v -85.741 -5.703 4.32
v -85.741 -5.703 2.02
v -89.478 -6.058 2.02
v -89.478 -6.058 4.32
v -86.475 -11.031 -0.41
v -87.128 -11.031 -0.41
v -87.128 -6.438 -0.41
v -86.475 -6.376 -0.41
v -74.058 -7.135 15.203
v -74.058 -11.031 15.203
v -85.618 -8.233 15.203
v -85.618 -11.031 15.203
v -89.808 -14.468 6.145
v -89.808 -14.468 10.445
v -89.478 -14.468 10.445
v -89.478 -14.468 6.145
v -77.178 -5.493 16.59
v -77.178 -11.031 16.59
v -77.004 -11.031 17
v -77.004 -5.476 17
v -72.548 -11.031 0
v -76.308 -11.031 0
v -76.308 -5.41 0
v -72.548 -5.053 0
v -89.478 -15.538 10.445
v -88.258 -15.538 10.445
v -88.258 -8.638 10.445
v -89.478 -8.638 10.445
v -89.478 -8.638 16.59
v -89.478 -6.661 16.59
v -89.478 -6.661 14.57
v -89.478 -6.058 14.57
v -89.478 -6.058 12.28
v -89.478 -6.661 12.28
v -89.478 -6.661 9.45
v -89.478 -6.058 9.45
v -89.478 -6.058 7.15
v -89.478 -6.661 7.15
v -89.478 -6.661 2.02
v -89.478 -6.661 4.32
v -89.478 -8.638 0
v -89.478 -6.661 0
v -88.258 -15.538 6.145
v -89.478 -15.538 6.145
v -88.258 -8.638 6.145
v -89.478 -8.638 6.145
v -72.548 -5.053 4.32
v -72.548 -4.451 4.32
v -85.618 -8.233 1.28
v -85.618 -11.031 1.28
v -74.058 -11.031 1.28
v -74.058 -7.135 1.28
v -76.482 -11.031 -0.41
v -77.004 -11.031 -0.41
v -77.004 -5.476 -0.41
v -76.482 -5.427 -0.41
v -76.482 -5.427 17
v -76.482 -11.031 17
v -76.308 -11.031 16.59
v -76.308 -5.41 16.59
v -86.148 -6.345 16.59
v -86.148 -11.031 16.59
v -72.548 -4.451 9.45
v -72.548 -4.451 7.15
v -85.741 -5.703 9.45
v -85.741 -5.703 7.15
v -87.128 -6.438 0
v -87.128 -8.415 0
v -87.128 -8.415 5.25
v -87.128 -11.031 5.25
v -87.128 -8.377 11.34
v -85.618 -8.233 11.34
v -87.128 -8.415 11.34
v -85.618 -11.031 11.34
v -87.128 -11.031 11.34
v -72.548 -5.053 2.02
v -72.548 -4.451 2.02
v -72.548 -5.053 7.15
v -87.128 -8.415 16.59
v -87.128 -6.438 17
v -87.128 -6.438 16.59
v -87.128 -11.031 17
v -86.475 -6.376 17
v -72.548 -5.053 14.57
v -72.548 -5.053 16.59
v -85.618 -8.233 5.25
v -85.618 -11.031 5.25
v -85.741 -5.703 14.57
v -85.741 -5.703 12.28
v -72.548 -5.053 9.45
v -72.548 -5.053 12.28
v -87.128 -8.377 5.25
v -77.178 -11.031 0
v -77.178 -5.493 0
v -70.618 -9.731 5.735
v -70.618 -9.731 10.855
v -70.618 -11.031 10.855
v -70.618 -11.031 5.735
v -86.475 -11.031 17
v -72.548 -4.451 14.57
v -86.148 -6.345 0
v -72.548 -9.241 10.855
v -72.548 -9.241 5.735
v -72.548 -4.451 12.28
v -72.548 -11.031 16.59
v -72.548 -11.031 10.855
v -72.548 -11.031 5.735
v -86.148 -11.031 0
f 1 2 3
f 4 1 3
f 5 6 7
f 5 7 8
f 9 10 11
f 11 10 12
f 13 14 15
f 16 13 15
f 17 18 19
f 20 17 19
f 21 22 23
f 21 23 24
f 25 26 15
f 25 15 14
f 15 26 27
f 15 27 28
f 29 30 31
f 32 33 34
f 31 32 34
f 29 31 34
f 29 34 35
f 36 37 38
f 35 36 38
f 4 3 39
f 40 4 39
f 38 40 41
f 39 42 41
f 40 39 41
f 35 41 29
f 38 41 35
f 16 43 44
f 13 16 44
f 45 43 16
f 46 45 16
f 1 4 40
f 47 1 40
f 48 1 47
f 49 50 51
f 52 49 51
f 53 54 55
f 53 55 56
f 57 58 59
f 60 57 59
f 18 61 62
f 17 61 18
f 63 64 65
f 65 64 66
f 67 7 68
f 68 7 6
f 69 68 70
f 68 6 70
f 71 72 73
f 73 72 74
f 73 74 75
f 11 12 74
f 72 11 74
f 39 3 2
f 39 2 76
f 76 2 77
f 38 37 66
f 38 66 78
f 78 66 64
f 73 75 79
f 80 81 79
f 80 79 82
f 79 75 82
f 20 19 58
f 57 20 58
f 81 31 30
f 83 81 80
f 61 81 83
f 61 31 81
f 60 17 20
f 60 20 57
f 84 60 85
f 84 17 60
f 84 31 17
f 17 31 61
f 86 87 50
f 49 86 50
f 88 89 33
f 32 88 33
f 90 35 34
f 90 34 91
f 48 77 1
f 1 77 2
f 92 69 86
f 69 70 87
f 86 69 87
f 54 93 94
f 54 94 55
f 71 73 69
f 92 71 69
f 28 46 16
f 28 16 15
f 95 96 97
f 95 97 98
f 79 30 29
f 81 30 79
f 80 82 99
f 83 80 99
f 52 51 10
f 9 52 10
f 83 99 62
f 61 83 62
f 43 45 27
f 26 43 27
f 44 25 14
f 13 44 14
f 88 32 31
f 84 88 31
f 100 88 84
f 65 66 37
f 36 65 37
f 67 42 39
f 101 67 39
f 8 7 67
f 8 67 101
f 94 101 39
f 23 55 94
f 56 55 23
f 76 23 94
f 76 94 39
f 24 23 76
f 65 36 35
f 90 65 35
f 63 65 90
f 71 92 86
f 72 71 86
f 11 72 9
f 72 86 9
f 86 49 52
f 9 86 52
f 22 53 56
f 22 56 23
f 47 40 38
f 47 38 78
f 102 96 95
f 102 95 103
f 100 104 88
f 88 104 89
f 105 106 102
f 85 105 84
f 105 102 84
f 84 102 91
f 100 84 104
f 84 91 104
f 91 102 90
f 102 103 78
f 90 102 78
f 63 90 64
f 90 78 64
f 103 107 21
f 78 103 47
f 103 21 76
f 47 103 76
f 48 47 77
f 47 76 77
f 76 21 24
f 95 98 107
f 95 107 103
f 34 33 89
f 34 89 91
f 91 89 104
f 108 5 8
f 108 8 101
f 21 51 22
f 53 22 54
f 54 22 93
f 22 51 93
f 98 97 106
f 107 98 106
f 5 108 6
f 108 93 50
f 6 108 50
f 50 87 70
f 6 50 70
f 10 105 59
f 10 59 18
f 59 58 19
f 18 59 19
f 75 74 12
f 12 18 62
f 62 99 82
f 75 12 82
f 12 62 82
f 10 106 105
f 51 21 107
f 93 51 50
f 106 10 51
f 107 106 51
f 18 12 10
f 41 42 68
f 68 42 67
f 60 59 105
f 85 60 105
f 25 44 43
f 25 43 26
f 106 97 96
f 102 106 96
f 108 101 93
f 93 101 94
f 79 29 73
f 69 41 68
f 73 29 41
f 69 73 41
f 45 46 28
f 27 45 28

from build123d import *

# Parameters (mm, degrees)
BOSS_EXTRUDE1_DEPTH              = 16.59
BOSS_EXTRUDE2_DEPTH              = 6
SKETCH4_W                        = 17.571797515
SKETCH4_H                        = 4.04
SKETCH4_H_2                      = 2.83
CUT_EXTRUDE1_DEPTH               = 0.6
CUT_EXTRUDE2_DEPTH               = 1
SKETCH8_W                        = 5.12
SKETCH8_H                        = 1.79
BOSS_EXTRUDE3_DEPTH              = 1.93
CUT_EXTRUDE4_REACH               = 92.856
CUT_EXTRUDE5_REACH               = 95.246
CUT_EXTRUDE5_OFFSET_FROM_SURFACE = 1.93
SKETCH11_W                       = 4.3
SKETCH11_H                       = 6.9
BOSS_EXTRUDE4_DEPTH              = 1.22
BOSS_EXTRUDE5_DEPTH              = 4.3


with BuildPart() as part:
    # Sketch1 → Boss-Extrude1 (new body)
    with BuildSketch(Plane.XY):
        Polygon((-87.128079616, -11.030638703), (-72.548079616, -11.030638703), (-72.548079616, -4.450638703), (-85.740988622, -5.703457269), (-89.478079616, -6.058337075), (-89.478079616, -8.638337075), (-87.128079616, -8.415177525), align=None)
    extrude(amount=BOSS_EXTRUDE1_DEPTH)

    # Sketch6 → Boss-Extrude2 (add)
    with BuildSketch(Plane.XZ.offset(11.030638703)):
        Polygon((-87.128079616, 16.59), (-87.128079616, 17), (-86.474746282, 17), (-86.148079616, 16.59), align=None)
        Polygon((-77.178079616, 16.59), (-77.004079616, 17), (-76.482079616, 17), (-76.308079616, 16.59), align=None)
        Polygon((-87.128079616, 0), (-87.128079616, -0.41), (-86.474746282, -0.41), (-86.148079616, 0), align=None)
        Polygon((-77.178079616, 0), (-77.004079616, -0.41), (-76.482079616, -0.41), (-76.308079616, 0), align=None)
    extrude(amount=-BOSS_EXTRUDE2_DEPTH)

    # Sketch4 → Cut-Extrude1 (cut)
    with BuildSketch(Plane(origin=(-0.229506985, 2.416842188, 0), x_dir=(0.9955214229157637, 0.09453621801073521, 0), z_dir=(-0.0945362180107352, 0.9955214229157636, 0))):
        with Locations((-81.429812757, 0)):
            Rectangle(SKETCH4_W, SKETCH4_H)
        with Locations((-81.429812757, -16.59)):
            Rectangle(SKETCH4_W, SKETCH4_H)
        with Locations((-81.429812757, -5.735)):
            Rectangle(SKETCH4_W, SKETCH4_H_2)
        with Locations((-81.429812757, -10.865)):
            Rectangle(SKETCH4_W, SKETCH4_H_2)
    extrude(amount=-CUT_EXTRUDE1_DEPTH, mode=Mode.SUBTRACT)


with BuildPart() as cut_extrude1_piece_1:
    # of the separate pieces the step leaves, piece 1, a body of its own (cut_extrude1_pieces)
    add(part.part.solids().sort_by_distance((-87.128079616, -11.030638703, 17))[0])

    # Sketch8 → Boss-Extrude3 (add)
    with BuildSketch(Plane(origin=(-72.548079616, 0, 0), x_dir=(0, 0, -1), z_dir=(1, 0, 0))):
        with Locations((-8.295, -10.135638703)):
            Rectangle(SKETCH8_W, SKETCH8_H)
    extrude(amount=BOSS_EXTRUDE3_DEPTH)

    # Sketch9 → Cut-Extrude4 (cut, up to next)
    with BuildSketch(Plane.XY.offset(10.855), mode=Mode.PRIVATE) as cut_extrude4_sk1:
        Polygon((-70.618079616, -9.730638703), (-72.548079616, -9.240638703), (-70.618079616, -9.240638703), align=None)
    cut_extrude4_tool1 = extrude(cut_extrude4_sk1.sketch, amount=-CUT_EXTRUDE4_REACH, mode=Mode.PRIVATE) & cut_extrude1_piece_1.part
    add(cut_extrude4_tool1.solids().sort_by_distance((-71.261413, -9.403972, 10.855))[0], mode=Mode.SUBTRACT)

    # Cut-Extrude5: up to this face of the body (flat: up to its plane, moved by the offset)
    cut_extrude5_end = Plane(cut_extrude1_piece_1.part.faces().sort_by_distance((-81.032910057, -5.859070253, 15.601370182))[0]).offset(-CUT_EXTRUDE5_OFFSET_FROM_SURFACE)
    # Sketch10 → Cut-Extrude5 (cut, up to the picked face)
    with BuildSketch(Plane.XZ.offset(11.030638703), mode=Mode.PRIVATE) as cut_extrude5_sk1:
        Polygon((-74.058079616, 15.203261076), (-85.618079616, 15.203261076), (-85.618079616, 11.34), (-87.128079616, 11.34), (-87.128079616, 5.25), (-85.618079616, 5.25), (-85.618079616, 1.28), (-74.058079616, 1.28), align=None)
    cut_extrude5_tool1 = split(extrude(cut_extrude5_sk1.sketch, amount=-CUT_EXTRUDE5_REACH, mode=Mode.PRIVATE), bisect_by=cut_extrude5_end, keep=Keep.BOTH, mode=Mode.PRIVATE)
    add(cut_extrude5_tool1.solids().sort_by(Axis((-80.191272, -11.030639, 8.244515), (0, 1, 0)))[0], mode=Mode.SUBTRACT)


with BuildPart() as cut_extrude1_piece_2:
    # of the separate pieces the step leaves, piece 2, a body of its own (cut_extrude1_pieces)
    add(part.part.solids().sort_by_distance((-87.128079616, -5.835177525, 0))[0])


with BuildPart() as cut_extrude1_piece_3:
    # of the separate pieces the step leaves, piece 3, a body of its own (cut_extrude1_pieces)
    add(part.part.solids().sort_by_distance((-87.128079616, -5.835177525, 17))[0])


with BuildPart() as cut_extrude2_tool:
    # Sketch7 → Cut-Extrude2 (new body)
    with BuildSketch(Plane(origin=(0, -5.030638703, 0), x_dir=(1, 0, 0), z_dir=(0, 1, 0))):
        Polygon((-87.128079616, -17), (-86.474746282, -17), (-86.148079616, -16.59), (-87.128079616, -16.59), align=None)
        Polygon((-87.128079616, 0), (-87.128079616, 0.41), (-86.474746282, 0.41), (-86.148079616, 0), align=None)
    extrude(amount=-CUT_EXTRUDE2_DEPTH)


with BuildPart() as cut_extrude1_piece_2_1:
    add(cut_extrude1_piece_2.part)

    # Cut-Extrude2: cut by cut_extrude2_tool
    add(cut_extrude2_tool.part, mode=Mode.SUBTRACT)


with BuildPart() as cut_extrude1_piece_3_1:
    add(cut_extrude1_piece_3.part)

    # Cut-Extrude2: cut by cut_extrude2_tool
    add(cut_extrude2_tool.part, mode=Mode.SUBTRACT)


with BuildPart() as body_2:
    # Sketch11 → Boss-Extrude4 (new body)
    with BuildSketch(Plane.ZY.offset(89.478079616)):
        with Locations((8.295, -12.088337075)):
            Rectangle(SKETCH11_W, SKETCH11_H)
    extrude(amount=-BOSS_EXTRUDE4_DEPTH)

    # Sketch12 → Boss-Extrude5 (add)
    with BuildSketch(Plane(origin=(0, 0, 6.145), x_dir=(-1, 0, 0), z_dir=(0, 0, -1))):
        Polygon((89.478079616, -15.538337075), (89.808079616, -14.468337075), (89.478079616, -14.468337075), align=None)
    extrude(amount=-BOSS_EXTRUDE5_DEPTH)


solid = Compound([cut_extrude1_piece_1.part, body_2.part])
